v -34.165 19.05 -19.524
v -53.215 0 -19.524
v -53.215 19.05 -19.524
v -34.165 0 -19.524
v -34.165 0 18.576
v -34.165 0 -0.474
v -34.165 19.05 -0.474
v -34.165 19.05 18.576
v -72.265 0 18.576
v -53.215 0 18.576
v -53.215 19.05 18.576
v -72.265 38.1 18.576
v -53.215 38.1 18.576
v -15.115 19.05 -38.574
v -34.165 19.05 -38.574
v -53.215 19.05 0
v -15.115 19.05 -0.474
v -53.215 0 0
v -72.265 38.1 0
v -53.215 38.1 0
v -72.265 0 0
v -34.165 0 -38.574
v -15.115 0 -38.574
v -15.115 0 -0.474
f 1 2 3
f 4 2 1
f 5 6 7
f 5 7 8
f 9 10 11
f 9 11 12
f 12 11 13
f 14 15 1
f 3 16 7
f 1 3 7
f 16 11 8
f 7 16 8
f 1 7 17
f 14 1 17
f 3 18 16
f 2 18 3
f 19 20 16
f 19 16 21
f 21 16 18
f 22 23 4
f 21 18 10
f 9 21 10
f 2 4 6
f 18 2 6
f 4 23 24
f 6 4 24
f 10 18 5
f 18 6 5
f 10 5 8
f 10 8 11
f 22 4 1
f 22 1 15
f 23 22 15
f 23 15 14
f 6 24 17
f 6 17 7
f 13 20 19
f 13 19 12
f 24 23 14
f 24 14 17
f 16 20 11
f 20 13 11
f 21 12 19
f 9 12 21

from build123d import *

# Parameters (mm, degrees)
F1_DEPTH = 19.05
F2_W     = 19.05
F2_H     = 18.575629
F3_DEPTH = 19.05


with BuildPart() as f1:
    # F0 (on Front) → F1 (new body)
    with BuildSketch(Plane.XZ):
        Polygon((-34.164888, 18.575629), (-53.214888, 18.575629), (-53.214888, -19.524371), (-34.164888, -19.524371), (-34.164888, -0.474371), align=None)
        Polygon((-15.114888, -0.474371), (-34.164888, -0.474371), (-34.164888, -19.524371), (-34.164888, -38.574371), (-15.114888, -38.574371), align=None)
    extrude(amount=-F1_DEPTH)

    # F2 (on face) → F3 (join)
    with BuildSketch(Plane(origin=(-53.214888, 0, 0), x_dir=(0, -1, 0), z_dir=(-1, 0, 0))):
        with Locations((-9.525, 9.287814)):
            Rectangle(F2_W, F2_H)
        with Locations((-28.575, 9.287814)):
            Rectangle(F2_W, F2_H)
    extrude(amount=F3_DEPTH)


solid = f1.part
